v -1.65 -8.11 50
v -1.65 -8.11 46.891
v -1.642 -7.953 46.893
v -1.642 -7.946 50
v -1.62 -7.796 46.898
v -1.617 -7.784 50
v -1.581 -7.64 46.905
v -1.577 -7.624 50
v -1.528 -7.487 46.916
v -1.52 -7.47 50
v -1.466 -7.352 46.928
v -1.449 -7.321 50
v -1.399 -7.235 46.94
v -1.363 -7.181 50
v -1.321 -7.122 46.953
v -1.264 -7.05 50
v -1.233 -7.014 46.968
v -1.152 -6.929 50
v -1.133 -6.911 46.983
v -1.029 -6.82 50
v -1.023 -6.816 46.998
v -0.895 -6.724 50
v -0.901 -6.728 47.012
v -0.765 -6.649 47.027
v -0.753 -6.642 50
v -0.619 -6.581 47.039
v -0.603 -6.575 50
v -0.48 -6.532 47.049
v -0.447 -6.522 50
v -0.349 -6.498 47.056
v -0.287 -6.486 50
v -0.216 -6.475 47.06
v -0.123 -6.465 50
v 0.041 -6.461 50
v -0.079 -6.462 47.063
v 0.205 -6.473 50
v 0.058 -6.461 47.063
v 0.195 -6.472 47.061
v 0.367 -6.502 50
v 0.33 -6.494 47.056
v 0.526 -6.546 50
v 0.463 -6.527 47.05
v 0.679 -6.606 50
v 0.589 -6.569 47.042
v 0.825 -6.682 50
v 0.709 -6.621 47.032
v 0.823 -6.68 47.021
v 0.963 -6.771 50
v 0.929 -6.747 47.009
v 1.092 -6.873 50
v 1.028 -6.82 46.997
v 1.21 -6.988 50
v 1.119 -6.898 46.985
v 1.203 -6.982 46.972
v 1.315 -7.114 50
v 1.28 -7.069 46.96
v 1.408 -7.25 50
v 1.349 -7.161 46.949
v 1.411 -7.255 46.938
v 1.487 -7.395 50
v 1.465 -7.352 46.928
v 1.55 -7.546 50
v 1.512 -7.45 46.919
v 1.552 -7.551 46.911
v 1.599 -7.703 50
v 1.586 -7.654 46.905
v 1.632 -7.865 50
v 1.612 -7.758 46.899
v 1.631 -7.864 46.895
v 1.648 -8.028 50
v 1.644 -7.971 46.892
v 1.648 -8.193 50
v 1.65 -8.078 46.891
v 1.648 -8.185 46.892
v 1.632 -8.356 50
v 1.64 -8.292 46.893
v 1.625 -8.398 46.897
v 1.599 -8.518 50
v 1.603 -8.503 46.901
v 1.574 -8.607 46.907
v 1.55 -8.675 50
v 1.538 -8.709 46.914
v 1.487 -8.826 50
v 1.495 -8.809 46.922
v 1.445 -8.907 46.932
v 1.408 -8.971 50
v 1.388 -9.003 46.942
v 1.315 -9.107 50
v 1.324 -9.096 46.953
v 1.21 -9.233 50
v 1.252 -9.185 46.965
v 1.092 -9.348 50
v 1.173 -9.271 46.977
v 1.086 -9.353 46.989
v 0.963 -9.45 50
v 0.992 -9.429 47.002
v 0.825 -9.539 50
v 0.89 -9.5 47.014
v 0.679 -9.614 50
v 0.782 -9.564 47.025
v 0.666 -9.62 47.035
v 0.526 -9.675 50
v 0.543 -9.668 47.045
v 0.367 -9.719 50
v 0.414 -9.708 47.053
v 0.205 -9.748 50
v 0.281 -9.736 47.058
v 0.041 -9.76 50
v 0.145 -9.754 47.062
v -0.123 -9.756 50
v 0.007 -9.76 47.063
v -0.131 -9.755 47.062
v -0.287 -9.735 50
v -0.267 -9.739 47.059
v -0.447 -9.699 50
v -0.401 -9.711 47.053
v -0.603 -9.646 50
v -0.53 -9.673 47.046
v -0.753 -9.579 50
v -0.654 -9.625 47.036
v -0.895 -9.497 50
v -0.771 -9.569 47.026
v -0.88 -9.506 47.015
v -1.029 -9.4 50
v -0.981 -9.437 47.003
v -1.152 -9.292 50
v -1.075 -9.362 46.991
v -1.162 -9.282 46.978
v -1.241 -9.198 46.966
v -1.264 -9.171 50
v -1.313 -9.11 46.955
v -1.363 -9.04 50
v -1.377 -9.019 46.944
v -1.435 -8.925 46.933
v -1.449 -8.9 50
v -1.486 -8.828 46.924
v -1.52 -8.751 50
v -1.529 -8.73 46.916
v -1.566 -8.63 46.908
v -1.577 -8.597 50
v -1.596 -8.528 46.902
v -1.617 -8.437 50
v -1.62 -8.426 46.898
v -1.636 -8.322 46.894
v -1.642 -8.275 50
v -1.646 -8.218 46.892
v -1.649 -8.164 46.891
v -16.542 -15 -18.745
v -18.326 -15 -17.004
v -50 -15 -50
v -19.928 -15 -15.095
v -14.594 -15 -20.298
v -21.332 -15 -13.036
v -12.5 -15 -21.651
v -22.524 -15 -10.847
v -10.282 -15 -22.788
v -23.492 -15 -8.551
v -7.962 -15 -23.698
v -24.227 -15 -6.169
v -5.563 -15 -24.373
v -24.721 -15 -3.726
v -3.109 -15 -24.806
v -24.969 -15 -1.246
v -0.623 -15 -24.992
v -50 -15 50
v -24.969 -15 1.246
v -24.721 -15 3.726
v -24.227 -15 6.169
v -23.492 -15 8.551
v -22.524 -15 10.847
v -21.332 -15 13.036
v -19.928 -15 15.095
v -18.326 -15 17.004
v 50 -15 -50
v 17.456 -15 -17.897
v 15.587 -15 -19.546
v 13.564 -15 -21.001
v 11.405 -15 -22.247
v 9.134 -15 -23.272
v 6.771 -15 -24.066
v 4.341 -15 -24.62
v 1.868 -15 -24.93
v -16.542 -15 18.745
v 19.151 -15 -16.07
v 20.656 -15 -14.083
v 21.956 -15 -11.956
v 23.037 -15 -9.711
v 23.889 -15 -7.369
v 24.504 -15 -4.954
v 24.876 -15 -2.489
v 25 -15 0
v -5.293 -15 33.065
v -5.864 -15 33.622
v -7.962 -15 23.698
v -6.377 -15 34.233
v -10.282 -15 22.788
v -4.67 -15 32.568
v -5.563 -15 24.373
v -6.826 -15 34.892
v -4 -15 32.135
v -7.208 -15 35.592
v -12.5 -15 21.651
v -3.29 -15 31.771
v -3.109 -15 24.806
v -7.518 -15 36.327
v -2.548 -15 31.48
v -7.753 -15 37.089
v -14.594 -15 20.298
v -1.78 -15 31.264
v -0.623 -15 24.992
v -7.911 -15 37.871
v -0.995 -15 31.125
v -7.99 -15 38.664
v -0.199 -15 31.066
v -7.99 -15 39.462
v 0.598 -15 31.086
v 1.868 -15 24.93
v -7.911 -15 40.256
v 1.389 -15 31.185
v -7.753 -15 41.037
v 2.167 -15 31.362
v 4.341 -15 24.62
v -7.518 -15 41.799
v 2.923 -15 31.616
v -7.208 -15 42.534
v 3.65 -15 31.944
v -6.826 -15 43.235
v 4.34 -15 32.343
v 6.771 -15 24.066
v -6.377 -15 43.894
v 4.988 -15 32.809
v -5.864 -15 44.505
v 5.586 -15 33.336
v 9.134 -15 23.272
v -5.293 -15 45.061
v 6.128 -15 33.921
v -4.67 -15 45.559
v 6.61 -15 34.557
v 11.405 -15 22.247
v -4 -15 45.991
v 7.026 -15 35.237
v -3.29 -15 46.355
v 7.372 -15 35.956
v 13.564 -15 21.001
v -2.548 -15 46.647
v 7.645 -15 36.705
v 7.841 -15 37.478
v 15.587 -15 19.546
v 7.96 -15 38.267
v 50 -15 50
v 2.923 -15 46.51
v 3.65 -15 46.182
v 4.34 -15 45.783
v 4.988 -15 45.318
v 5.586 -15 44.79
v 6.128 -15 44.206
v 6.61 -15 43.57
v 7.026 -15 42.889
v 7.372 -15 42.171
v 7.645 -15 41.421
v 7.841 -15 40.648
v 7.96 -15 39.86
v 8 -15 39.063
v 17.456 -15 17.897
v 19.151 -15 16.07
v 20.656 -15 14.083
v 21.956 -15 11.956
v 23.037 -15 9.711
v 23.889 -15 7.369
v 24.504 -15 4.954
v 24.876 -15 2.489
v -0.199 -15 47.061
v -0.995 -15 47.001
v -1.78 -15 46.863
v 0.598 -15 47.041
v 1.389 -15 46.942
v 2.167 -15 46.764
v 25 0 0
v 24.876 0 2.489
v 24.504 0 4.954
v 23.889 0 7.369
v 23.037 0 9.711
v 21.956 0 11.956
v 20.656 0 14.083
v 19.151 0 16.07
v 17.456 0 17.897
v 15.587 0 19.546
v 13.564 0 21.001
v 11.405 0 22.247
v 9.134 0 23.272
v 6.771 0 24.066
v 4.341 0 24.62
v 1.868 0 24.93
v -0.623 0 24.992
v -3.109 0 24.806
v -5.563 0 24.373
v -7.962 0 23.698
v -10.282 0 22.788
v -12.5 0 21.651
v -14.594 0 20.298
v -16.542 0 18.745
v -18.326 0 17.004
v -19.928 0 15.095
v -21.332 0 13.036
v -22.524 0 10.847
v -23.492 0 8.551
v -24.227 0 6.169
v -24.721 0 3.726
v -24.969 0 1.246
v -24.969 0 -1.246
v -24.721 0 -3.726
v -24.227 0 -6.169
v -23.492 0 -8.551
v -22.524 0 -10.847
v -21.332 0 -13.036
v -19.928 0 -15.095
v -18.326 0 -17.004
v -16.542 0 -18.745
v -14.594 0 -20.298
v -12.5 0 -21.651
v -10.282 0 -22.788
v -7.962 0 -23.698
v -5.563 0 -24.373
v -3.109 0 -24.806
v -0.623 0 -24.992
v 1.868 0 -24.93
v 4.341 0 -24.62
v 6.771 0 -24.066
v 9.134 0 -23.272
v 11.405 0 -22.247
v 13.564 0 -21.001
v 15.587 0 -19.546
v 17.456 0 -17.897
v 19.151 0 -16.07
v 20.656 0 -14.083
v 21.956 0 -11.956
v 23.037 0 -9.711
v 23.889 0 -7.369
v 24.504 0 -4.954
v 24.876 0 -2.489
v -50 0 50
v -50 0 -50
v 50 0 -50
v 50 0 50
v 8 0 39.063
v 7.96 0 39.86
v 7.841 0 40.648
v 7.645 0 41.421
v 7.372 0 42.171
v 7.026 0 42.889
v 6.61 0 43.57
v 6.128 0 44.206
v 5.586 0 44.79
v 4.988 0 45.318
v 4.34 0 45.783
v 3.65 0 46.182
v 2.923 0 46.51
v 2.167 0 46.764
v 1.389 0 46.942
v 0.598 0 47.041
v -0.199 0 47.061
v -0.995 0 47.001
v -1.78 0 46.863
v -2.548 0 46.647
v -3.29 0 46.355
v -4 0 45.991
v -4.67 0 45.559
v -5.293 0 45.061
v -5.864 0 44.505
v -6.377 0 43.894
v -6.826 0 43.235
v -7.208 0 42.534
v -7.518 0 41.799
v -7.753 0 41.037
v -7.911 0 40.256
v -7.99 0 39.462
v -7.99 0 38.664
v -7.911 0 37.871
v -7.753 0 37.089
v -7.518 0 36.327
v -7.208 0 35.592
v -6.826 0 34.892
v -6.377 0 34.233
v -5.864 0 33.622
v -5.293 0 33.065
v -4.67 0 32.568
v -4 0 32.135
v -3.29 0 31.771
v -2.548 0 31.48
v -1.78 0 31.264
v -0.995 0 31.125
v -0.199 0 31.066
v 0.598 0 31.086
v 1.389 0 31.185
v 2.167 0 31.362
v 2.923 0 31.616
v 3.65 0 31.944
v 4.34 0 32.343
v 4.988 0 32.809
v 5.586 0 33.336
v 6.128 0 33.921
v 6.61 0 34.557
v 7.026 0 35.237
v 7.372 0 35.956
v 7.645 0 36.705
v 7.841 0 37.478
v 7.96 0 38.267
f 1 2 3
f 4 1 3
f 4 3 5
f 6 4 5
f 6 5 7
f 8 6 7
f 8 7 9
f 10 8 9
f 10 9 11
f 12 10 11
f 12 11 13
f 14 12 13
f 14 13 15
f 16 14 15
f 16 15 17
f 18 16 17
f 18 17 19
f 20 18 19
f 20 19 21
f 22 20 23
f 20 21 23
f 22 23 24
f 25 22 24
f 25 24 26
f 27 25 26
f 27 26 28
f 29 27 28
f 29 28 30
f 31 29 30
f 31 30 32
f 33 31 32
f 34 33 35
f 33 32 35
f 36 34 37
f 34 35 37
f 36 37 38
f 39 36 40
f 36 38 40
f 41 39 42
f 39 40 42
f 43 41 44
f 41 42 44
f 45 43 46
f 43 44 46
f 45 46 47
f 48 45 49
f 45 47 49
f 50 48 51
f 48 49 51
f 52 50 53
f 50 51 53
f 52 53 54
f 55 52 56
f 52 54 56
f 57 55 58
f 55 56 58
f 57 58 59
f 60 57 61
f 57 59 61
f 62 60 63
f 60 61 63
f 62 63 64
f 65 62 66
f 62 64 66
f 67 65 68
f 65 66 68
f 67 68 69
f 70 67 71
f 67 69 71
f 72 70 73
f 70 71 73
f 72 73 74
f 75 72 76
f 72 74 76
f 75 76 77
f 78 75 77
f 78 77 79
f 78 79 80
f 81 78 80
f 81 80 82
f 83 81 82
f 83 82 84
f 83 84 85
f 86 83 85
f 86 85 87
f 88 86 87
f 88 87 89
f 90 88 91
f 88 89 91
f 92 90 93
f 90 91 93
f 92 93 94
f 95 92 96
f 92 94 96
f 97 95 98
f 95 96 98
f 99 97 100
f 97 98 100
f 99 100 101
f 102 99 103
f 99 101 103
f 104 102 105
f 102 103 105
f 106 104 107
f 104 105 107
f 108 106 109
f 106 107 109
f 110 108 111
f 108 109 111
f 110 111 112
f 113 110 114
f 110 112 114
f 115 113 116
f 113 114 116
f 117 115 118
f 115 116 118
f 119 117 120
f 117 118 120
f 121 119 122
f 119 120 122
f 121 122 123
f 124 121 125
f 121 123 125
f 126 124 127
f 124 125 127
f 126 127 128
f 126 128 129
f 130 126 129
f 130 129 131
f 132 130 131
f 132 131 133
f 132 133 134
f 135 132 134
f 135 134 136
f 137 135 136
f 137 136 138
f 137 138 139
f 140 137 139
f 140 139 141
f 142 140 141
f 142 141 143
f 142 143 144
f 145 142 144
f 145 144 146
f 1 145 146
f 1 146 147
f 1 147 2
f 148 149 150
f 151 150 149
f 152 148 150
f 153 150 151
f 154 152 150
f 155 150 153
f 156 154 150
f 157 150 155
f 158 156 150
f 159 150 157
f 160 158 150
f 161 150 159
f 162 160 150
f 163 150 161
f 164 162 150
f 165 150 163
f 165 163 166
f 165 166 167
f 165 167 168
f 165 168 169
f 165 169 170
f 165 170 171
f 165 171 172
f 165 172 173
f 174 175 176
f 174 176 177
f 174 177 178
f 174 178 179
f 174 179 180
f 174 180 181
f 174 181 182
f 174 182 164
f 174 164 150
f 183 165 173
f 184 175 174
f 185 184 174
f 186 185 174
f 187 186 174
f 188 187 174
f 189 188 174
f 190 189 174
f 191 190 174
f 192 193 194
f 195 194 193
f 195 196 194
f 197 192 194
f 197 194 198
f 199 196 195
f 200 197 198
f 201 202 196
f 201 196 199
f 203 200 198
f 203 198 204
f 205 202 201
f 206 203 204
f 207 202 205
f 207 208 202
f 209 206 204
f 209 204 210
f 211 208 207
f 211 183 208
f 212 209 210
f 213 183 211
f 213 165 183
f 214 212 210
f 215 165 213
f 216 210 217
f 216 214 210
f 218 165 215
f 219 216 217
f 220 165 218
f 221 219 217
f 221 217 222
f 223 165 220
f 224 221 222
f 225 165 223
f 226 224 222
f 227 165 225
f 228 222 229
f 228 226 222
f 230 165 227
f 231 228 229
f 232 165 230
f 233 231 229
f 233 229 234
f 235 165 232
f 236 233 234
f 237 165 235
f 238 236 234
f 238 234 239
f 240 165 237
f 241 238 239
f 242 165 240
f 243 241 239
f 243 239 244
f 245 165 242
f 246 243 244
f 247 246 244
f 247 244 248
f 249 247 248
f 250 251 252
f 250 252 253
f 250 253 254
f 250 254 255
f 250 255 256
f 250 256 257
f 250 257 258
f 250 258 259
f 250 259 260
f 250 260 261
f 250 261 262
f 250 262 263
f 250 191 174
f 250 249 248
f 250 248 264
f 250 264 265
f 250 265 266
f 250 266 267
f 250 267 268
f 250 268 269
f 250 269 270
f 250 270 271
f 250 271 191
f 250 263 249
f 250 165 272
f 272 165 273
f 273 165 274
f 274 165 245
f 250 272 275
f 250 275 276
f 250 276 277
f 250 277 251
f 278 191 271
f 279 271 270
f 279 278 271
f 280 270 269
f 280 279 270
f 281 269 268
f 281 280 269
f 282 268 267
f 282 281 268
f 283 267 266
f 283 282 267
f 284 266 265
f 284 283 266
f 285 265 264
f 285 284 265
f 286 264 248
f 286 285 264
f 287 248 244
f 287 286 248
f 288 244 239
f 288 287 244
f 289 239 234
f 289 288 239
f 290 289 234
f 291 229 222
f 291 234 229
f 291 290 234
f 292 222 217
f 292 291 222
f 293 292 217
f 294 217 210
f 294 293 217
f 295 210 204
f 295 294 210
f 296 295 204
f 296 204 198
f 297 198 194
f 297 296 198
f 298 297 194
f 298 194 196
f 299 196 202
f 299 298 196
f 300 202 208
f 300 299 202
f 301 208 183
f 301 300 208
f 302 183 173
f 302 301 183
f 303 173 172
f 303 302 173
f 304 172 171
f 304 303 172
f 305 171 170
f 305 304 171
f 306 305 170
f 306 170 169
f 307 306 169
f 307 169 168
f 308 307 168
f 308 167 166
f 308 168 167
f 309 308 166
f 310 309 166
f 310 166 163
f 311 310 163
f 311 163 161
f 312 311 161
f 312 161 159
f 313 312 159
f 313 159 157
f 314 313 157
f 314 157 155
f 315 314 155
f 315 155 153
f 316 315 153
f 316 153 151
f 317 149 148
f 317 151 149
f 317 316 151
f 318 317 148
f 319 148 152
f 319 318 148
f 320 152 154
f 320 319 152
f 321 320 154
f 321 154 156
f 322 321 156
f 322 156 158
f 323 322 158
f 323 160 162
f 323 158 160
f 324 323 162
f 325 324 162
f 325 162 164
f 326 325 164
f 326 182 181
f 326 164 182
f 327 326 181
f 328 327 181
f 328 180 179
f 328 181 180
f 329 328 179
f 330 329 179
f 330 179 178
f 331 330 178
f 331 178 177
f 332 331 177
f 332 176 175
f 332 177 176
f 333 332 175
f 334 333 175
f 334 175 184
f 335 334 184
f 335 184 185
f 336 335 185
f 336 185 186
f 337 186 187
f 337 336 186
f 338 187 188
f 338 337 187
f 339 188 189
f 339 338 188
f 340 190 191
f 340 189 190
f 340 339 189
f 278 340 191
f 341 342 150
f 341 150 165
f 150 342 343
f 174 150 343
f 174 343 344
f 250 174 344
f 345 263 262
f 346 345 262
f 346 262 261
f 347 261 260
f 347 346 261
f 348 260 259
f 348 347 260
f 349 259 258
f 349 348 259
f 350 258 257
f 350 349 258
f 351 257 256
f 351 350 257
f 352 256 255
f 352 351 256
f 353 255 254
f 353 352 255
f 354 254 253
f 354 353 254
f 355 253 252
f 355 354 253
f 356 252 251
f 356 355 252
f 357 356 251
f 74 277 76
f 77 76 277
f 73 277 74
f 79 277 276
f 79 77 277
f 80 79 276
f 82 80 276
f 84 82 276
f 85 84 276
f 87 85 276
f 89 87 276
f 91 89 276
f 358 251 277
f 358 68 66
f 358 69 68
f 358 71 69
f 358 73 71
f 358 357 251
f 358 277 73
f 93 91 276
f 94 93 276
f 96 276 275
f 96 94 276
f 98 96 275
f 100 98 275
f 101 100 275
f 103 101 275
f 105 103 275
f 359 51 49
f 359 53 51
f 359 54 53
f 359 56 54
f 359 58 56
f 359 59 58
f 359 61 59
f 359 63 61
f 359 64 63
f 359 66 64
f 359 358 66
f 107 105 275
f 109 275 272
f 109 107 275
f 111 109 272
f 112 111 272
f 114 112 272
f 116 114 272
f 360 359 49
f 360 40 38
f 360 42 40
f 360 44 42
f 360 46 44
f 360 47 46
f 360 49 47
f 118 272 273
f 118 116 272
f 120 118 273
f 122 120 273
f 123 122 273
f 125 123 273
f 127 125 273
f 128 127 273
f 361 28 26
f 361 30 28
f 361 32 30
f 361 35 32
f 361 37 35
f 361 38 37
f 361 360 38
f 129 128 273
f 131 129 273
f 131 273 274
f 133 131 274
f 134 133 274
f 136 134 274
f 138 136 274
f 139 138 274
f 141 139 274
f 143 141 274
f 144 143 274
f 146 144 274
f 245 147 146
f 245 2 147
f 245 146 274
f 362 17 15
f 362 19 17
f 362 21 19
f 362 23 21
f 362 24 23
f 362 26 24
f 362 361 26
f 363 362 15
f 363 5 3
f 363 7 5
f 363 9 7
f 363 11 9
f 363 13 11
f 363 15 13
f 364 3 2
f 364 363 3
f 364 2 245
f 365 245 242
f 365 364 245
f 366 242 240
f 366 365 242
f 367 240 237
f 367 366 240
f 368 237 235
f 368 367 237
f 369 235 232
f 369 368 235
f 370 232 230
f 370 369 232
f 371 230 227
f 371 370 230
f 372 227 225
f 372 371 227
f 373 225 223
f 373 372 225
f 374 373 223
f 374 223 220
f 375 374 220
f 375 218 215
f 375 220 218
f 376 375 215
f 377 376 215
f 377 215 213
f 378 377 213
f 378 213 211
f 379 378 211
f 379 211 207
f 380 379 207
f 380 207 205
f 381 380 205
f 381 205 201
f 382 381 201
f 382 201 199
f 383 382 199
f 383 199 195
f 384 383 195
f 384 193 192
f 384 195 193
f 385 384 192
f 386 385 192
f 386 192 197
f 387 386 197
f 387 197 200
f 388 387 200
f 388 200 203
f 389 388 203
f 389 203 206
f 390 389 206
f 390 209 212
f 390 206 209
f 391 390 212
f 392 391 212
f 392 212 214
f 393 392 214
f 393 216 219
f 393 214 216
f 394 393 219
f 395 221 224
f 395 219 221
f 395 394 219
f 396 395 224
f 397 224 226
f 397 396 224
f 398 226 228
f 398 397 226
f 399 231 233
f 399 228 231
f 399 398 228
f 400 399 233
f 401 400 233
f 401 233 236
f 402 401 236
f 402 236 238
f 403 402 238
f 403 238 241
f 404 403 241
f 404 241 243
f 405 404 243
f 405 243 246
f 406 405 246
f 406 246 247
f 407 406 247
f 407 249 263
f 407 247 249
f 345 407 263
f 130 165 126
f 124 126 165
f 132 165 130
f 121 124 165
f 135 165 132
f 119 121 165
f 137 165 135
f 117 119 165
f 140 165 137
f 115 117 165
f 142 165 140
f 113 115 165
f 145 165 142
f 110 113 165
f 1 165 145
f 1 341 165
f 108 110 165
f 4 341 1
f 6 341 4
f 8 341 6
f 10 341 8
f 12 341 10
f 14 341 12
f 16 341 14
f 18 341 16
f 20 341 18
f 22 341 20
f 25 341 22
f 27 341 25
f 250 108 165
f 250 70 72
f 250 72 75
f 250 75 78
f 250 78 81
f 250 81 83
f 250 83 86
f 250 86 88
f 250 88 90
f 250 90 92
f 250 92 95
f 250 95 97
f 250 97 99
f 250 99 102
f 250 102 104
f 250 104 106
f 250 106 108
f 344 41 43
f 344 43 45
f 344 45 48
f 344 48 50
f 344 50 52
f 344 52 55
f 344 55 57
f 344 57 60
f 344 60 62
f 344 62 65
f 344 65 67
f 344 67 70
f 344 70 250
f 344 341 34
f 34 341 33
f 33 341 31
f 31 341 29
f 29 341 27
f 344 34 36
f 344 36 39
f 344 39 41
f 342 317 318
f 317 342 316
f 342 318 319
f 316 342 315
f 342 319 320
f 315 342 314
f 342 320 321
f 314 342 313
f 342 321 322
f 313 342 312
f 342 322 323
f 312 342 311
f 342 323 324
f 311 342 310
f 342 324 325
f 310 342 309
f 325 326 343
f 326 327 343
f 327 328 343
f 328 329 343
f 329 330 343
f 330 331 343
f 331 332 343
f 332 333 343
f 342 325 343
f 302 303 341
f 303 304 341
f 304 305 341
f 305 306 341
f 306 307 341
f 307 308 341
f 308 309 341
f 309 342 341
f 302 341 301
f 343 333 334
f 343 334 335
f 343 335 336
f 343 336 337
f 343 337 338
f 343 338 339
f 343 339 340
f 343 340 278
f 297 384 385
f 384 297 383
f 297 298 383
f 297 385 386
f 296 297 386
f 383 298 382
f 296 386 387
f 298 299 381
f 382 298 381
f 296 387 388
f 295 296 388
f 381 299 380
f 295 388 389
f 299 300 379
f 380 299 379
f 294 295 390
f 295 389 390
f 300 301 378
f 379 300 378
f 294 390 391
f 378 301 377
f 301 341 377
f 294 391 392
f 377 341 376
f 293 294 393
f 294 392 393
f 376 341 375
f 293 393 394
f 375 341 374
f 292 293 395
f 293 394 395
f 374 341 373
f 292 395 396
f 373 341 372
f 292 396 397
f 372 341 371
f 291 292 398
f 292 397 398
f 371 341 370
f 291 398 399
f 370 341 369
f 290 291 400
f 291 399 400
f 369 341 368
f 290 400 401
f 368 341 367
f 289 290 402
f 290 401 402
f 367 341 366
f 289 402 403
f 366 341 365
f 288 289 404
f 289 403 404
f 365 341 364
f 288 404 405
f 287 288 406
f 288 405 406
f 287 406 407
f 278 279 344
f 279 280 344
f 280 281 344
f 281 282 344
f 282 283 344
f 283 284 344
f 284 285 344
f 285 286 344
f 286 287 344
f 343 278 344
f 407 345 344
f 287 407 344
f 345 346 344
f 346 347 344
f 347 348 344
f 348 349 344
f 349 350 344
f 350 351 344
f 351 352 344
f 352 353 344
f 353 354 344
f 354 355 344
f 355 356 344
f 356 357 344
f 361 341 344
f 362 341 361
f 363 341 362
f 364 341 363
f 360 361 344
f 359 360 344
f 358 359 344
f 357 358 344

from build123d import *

# Parameters (mm, degrees)
F0_W     = 100
F0_H     = 100
F2_DEPTH = 15
F1_R     = 25
F3_DEPTH = 15.001
F4_R     = 8
F5_DEPTH = 15.001
F7_D     = 3.3
F7_DEPTH = 13.5
F7_TIP   = 0.9914200214


with BuildPart() as f2:
    # F0 (on Front) → F2 (new body)
    with BuildSketch(Plane.XZ):
        Rectangle(F0_W, F0_H)
    extrude(amount=F2_DEPTH)

    # F1 (on Front) → F3 (cut, through all)
    with BuildSketch(Plane.XZ):
        Circle(F1_R)
    extrude(amount=F3_DEPTH, mode=Mode.SUBTRACT)

    # F4 (on Front) → F5 (cut, through all)
    with BuildSketch(Plane.XZ):
        with Locations((0, 39.0632459029)):
            Circle(F4_R)
    extrude(amount=F5_DEPTH, mode=Mode.SUBTRACT)

    # F7
    with Locations(Plane.XY.offset(50)):
        with Locations((0, -8.1104654819)):
            Hole(F7_D / 2, depth=F7_DEPTH)
            with Locations((0, 0, -(F7_DEPTH + F7_TIP / 2))):  # 118° drill point
                Cone(0, F7_D / 2, F7_TIP, mode=Mode.SUBTRACT)


solid = f2.part
